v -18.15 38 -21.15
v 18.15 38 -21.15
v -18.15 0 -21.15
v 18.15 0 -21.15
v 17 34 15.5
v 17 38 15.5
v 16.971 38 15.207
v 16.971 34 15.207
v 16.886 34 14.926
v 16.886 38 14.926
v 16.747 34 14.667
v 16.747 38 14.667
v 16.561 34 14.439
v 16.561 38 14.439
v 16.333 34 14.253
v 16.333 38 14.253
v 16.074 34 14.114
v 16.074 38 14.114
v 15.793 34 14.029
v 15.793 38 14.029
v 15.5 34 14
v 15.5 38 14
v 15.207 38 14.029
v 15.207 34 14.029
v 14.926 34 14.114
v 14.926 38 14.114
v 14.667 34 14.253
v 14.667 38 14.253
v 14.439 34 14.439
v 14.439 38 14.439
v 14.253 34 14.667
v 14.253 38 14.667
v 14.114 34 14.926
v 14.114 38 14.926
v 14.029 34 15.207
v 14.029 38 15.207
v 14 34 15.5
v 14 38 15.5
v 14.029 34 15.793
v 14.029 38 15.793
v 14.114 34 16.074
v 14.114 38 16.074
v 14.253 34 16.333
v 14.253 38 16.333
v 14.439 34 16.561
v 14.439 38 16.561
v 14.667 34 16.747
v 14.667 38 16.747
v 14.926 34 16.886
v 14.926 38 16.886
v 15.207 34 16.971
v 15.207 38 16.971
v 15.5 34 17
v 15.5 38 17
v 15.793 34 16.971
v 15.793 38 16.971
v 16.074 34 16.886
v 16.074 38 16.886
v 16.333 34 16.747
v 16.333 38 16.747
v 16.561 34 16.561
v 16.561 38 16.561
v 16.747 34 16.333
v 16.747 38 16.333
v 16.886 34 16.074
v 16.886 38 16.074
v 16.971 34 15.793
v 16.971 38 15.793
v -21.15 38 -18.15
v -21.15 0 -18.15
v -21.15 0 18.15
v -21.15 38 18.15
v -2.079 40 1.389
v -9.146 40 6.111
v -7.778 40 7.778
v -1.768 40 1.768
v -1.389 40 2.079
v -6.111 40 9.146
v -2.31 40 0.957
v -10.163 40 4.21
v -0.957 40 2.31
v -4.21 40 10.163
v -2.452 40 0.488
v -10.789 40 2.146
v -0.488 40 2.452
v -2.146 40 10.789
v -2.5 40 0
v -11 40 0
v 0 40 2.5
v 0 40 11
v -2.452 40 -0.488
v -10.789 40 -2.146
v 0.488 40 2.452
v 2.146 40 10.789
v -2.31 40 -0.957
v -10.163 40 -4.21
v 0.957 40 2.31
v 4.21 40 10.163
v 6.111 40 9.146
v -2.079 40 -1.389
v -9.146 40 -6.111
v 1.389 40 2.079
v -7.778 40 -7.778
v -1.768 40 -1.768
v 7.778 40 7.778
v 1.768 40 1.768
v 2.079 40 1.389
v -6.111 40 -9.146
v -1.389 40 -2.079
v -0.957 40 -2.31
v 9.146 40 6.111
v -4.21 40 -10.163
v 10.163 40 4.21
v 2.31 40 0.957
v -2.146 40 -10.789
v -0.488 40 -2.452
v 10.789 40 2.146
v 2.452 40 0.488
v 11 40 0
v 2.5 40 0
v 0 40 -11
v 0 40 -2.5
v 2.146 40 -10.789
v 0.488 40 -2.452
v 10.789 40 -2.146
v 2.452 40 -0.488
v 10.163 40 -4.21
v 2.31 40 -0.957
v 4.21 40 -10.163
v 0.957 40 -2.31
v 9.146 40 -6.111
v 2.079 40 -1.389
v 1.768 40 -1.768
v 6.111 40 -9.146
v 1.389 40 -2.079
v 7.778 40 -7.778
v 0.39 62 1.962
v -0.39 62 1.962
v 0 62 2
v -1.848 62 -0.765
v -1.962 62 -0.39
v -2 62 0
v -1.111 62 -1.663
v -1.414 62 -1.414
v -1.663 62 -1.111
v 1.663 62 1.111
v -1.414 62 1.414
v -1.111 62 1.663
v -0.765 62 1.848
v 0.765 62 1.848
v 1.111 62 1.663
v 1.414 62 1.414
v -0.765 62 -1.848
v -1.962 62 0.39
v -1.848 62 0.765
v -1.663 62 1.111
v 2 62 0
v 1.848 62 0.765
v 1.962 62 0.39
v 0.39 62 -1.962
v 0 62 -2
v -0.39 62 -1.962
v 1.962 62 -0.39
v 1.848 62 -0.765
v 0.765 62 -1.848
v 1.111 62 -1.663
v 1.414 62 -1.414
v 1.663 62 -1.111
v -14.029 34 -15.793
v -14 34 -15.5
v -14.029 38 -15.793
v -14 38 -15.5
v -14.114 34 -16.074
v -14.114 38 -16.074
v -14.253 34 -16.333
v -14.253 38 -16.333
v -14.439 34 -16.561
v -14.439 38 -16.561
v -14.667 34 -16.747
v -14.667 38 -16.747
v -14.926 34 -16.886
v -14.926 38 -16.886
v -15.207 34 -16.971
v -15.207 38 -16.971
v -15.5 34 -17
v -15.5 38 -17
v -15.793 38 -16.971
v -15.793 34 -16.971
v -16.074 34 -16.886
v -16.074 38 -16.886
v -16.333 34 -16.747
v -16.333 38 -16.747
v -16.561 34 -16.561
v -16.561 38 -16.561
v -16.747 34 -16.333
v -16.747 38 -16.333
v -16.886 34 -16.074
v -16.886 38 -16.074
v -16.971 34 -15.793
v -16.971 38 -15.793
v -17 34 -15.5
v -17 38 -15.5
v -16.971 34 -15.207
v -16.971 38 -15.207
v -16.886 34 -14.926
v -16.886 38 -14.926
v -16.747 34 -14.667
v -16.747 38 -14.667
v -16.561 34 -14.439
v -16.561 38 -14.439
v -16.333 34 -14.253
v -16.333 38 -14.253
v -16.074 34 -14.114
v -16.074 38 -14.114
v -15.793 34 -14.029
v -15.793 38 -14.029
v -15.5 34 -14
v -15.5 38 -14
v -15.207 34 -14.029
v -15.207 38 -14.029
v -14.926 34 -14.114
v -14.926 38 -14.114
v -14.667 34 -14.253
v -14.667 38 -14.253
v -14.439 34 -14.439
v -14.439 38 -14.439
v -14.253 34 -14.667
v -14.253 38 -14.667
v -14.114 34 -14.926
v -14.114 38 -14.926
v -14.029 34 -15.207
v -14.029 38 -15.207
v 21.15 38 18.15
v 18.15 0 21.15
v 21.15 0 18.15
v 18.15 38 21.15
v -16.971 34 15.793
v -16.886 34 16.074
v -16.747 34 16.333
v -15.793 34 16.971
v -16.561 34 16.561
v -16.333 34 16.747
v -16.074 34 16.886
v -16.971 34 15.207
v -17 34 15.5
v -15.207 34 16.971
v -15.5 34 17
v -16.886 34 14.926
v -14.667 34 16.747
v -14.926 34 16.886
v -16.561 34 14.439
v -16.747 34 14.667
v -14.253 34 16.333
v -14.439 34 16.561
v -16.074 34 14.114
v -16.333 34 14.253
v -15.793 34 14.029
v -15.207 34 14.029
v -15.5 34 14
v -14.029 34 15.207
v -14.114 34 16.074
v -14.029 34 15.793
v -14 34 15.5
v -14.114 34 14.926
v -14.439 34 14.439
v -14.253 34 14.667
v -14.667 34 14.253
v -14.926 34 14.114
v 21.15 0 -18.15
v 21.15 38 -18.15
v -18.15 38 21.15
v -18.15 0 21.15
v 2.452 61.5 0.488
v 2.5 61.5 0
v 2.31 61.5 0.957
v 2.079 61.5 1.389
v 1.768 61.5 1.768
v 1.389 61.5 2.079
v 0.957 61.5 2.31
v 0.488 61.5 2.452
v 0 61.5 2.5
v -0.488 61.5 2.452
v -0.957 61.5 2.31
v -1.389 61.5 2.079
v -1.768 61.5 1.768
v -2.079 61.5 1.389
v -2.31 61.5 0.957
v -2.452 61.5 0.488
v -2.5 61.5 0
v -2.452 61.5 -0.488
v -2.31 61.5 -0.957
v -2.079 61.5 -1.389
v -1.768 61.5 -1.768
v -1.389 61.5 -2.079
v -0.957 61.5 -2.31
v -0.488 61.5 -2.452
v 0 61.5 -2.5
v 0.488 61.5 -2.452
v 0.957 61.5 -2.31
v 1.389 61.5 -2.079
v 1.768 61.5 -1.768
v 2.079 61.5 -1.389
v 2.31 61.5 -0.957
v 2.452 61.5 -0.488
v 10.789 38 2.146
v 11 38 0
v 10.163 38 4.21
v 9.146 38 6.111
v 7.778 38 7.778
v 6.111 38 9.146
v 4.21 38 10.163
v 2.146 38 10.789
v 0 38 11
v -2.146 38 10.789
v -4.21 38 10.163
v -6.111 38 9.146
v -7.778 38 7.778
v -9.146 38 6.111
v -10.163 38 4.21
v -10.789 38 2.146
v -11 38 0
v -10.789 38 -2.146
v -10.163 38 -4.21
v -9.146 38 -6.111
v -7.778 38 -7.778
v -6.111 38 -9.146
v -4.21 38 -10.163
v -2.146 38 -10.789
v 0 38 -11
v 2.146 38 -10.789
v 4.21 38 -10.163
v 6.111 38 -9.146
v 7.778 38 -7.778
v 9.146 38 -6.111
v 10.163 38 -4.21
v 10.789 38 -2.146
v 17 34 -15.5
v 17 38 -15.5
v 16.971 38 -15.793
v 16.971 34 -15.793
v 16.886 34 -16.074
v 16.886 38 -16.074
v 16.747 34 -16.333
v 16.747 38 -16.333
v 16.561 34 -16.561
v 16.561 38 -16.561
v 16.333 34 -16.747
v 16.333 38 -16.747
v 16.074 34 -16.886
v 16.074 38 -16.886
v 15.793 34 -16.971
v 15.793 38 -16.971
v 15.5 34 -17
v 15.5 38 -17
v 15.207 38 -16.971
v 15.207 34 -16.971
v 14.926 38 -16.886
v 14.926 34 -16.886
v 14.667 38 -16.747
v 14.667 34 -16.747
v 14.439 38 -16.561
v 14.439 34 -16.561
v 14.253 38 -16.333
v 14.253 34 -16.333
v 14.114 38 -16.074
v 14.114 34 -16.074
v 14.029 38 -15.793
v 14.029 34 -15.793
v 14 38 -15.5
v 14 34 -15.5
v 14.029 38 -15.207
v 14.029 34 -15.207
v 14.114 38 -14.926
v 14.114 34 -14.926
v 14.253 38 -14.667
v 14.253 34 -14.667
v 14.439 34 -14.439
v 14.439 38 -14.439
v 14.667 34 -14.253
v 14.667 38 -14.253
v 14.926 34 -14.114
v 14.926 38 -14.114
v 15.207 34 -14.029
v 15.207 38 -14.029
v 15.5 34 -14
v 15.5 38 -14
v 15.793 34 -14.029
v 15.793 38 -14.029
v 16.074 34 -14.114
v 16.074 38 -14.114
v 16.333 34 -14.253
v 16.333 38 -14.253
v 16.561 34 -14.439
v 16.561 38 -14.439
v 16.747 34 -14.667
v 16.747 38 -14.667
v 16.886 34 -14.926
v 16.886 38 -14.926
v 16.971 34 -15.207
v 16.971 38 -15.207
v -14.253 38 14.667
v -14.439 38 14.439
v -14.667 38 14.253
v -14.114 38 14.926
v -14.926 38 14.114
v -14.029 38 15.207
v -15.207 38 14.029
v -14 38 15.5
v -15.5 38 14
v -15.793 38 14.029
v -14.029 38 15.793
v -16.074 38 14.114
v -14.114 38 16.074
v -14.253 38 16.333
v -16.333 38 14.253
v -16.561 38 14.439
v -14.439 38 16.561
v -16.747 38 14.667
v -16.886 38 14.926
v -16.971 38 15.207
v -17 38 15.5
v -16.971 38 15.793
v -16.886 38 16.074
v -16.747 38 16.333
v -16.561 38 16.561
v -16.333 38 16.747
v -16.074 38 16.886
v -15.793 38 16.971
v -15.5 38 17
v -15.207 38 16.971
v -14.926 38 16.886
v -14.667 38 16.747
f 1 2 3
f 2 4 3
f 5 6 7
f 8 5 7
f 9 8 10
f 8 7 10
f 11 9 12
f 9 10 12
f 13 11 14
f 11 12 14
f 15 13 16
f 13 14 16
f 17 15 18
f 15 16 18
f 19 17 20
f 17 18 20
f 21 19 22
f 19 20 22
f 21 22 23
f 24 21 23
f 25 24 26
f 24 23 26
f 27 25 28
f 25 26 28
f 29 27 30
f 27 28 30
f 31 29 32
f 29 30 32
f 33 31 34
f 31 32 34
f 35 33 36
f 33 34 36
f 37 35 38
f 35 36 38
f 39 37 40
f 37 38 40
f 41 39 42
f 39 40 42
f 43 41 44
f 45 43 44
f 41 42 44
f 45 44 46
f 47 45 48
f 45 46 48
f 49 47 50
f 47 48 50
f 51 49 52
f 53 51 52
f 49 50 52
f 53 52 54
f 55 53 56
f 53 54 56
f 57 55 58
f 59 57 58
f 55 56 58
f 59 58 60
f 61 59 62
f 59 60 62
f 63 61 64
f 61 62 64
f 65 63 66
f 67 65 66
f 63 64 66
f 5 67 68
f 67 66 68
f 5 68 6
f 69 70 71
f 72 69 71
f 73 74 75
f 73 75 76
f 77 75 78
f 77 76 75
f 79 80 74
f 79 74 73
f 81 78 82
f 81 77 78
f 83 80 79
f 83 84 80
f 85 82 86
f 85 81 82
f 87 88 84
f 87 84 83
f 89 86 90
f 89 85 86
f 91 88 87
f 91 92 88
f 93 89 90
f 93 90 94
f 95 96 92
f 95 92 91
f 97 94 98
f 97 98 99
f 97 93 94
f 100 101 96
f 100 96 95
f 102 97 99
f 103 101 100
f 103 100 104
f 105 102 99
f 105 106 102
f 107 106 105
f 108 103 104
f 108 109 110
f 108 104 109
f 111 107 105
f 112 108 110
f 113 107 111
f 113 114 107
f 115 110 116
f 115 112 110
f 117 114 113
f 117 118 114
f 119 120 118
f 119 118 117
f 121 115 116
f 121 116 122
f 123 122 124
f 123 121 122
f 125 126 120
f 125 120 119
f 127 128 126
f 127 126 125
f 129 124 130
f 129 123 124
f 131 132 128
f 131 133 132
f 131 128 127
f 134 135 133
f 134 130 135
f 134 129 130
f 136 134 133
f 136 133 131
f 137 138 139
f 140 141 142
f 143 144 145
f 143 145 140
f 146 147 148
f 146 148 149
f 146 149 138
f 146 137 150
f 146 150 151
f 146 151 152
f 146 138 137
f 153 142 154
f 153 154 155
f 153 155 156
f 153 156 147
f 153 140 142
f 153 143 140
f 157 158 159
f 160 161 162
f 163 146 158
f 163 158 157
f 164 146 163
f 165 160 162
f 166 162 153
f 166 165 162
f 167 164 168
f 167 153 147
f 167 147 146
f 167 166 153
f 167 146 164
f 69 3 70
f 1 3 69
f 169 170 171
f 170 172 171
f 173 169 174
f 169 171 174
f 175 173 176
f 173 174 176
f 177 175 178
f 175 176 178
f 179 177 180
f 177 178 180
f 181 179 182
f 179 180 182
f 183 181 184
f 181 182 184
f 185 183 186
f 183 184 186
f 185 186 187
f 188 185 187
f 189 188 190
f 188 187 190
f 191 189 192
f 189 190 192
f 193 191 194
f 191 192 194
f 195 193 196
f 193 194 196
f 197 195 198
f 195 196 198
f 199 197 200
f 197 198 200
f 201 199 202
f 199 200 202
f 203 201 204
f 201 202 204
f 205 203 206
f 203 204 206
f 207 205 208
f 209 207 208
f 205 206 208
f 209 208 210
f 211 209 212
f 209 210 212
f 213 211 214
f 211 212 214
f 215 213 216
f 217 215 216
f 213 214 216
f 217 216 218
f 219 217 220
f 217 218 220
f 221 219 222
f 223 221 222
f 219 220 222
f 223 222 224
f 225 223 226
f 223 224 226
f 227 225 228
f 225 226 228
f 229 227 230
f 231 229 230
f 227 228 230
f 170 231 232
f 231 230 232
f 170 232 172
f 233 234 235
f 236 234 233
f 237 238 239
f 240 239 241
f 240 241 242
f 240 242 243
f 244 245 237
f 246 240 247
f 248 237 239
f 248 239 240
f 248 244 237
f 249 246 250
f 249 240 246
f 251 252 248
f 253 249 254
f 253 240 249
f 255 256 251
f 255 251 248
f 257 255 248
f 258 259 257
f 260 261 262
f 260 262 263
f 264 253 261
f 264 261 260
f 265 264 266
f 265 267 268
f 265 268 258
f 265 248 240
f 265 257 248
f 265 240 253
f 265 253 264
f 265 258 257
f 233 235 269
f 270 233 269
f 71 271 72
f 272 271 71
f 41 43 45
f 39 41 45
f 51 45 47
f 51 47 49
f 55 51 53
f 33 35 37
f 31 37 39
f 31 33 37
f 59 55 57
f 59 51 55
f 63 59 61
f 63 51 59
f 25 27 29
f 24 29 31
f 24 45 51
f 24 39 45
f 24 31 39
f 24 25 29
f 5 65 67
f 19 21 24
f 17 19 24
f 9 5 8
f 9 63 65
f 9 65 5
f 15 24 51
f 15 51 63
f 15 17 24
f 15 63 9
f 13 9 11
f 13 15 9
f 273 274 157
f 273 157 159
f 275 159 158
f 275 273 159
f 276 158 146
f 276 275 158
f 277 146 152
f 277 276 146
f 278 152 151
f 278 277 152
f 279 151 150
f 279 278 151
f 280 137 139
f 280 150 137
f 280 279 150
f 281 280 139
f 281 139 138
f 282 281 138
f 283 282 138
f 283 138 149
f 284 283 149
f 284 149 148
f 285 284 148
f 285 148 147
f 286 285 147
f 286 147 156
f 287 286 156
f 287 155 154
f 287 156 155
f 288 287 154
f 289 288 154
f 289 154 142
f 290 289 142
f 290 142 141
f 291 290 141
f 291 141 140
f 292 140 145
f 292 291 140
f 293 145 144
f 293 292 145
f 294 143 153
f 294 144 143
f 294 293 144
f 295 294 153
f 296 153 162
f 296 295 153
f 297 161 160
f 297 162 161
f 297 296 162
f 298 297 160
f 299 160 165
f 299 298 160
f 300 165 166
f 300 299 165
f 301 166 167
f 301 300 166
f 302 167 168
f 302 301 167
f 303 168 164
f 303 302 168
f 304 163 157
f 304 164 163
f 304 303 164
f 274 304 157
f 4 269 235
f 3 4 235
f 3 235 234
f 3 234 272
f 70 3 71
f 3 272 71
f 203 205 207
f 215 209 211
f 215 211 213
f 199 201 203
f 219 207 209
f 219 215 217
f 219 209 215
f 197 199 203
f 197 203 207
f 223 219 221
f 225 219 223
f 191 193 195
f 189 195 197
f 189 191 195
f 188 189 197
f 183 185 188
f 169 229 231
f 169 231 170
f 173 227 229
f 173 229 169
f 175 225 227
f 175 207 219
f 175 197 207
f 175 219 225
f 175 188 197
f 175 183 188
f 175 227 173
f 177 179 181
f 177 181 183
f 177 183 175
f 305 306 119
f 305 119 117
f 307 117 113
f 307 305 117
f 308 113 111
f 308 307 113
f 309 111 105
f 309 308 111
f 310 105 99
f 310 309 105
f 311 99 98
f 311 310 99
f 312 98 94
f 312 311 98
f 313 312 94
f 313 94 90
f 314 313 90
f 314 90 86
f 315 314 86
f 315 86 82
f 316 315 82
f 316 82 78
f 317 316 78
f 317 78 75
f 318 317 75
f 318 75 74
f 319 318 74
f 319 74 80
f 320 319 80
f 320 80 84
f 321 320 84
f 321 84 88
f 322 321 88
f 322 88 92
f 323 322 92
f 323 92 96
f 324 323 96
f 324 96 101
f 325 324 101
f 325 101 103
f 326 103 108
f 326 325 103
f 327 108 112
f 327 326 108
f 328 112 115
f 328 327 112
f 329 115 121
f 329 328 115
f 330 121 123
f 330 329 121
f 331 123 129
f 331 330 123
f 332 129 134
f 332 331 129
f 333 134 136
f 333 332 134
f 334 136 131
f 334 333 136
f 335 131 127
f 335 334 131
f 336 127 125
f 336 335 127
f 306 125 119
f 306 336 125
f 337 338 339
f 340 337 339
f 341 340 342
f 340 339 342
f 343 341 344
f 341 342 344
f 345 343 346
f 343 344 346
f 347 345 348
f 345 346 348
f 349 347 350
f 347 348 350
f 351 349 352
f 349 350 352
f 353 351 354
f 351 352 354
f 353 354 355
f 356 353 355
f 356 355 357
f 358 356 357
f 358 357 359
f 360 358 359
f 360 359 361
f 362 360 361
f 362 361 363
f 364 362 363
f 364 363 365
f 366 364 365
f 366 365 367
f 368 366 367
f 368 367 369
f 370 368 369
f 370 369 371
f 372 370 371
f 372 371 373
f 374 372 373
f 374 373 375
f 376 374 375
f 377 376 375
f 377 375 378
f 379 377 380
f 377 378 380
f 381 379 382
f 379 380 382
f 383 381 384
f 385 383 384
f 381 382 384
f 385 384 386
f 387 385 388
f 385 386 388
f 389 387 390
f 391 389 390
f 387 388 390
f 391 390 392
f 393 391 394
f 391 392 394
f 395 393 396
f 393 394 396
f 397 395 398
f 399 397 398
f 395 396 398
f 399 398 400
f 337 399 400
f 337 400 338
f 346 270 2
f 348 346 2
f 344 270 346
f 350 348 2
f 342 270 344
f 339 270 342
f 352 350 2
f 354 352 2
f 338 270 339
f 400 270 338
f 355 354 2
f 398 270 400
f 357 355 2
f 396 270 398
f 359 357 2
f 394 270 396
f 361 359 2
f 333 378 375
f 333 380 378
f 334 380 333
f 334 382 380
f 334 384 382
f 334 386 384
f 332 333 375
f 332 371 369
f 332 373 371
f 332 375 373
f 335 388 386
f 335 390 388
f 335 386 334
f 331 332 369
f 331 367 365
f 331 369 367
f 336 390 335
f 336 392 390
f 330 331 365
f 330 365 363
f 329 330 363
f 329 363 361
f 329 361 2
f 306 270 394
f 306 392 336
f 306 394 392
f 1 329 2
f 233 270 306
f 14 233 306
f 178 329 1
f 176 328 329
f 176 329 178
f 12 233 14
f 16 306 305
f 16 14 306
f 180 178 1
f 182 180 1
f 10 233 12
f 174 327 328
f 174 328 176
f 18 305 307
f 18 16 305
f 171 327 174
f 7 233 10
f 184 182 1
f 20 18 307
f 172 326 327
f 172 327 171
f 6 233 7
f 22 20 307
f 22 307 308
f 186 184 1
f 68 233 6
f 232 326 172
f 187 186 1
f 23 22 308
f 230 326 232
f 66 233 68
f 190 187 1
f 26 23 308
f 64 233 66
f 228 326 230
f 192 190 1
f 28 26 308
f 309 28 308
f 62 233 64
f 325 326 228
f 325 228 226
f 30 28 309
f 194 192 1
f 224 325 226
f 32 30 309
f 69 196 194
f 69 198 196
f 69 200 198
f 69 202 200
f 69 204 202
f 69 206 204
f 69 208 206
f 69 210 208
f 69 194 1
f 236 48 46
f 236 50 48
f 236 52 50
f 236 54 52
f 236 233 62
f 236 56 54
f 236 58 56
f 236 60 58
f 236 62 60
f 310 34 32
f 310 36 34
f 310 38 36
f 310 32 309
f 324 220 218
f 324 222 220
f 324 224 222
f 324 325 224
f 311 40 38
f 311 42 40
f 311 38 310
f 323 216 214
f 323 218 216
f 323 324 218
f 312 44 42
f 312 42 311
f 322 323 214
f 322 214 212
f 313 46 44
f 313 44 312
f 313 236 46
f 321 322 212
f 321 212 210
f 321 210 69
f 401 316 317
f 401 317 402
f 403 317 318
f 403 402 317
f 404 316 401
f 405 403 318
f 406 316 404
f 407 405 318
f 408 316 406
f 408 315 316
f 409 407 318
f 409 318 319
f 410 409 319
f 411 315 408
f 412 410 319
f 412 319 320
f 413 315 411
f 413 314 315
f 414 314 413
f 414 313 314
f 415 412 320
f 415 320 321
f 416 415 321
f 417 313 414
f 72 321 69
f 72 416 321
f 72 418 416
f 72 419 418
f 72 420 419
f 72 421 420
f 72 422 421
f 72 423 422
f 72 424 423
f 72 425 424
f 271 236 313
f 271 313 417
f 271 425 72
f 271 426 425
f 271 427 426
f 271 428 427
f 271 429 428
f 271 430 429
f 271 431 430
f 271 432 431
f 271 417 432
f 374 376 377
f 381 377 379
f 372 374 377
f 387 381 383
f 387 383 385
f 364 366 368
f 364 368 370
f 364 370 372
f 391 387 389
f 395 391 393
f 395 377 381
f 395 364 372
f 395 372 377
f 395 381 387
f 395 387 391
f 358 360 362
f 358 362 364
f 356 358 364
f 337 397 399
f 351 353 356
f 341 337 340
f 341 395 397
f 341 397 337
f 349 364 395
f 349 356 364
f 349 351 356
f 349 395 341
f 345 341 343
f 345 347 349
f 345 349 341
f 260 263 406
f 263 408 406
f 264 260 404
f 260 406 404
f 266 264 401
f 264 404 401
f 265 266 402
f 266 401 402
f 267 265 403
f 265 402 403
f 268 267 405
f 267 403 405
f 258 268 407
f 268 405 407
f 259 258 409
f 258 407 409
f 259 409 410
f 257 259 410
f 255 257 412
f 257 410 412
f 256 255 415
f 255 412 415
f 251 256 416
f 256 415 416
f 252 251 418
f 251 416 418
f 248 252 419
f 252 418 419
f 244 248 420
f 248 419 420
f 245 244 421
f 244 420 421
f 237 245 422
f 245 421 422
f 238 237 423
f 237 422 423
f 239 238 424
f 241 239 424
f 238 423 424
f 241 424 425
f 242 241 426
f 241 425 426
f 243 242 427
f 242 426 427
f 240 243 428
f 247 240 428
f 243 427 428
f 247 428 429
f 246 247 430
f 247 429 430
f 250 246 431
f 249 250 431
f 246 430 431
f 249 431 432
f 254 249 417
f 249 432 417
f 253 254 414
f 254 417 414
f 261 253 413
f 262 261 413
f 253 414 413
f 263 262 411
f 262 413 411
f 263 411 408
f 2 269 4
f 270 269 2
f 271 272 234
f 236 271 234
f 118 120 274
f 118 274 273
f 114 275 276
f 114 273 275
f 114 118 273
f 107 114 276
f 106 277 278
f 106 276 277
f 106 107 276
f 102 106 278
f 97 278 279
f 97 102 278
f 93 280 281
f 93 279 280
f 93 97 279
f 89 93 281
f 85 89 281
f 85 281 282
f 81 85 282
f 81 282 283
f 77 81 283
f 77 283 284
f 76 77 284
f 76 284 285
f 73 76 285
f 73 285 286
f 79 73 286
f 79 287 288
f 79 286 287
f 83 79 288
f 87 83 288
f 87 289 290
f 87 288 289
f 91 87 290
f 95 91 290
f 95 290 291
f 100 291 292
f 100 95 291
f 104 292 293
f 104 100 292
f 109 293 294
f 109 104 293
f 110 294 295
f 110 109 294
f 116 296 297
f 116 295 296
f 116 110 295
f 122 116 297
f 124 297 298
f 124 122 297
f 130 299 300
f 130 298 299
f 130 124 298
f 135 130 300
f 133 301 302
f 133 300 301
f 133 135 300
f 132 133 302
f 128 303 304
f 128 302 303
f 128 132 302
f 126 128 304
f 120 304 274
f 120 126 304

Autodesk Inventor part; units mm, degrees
ref_plane "YZ Plane" through (0, 0, 0) normal (1, 0, 0) x (0, 1, 0)
ref_plane "XZ Plane" through (0, 0, 0) normal (0, 1, 0) x (-1, 0, 0)
ref_plane "XY Plane" through (0, 0, 0) normal (0, 0, 1) x (1, 0, 0)
sketch "Sketch1" plane through (0, 0, 0) normal (0, 1, 0) x (-1, 0, 0)
  line L0 (21.15, 21.15) -> (-21.15, 21.15)
  line L1 (-21.15, 21.15) -> (-21.15, -21.15)
  line L2 (-21.15, -21.15) -> (21.15, -21.15)
  line L3 (21.15, -21.15) -> (21.15, 21.15)
  point P0 (0, 0)
  point P1 (21.15, 0)
  point P2 (0, -21.15)
  dimension "d0" = 42.3
  dimension "d1" = 42.3
extrude "Extrusion1" add sketch "Sketch1" along normal blind 38
chamfer "Chamfer1" distance 3 angle 45 4 edges at (21.15, 19, 21.15) (21.15, 19, -21.15) (-21.15, 19, -21.15) (-21.15, 19, 21.15)
sketch "Sketch2" plane through (0, 38, 0) normal (0, 1, 0) x (1, 0, 0)
  circle A0 centre (0, 0) radius 11
  dimension "d7" = 22
extrude "Extrusion2" add sketch "Sketch2" along normal blind 2
sketch "Sketch3" plane through (0, 40, 0) normal (0, 1, 0) x (1, 0, 0)
  circle A0 centre (0, 0) radius 2.5
  dimension "d10" = 5
extrude "Extrusion3" add sketch "Sketch3" along normal blind 22
chamfer "Chamfer2" distance 0.5 angle 45 1 edges at (-2.5, 62, 0)
sketch "Sketch4" plane through (0, 38, 0) normal (0, 1, 0) x (1, 0, 0)
  circle A0 centre (15.5, 15.5) radius 1.5
  circle A1 centre (15.5, -15.5) radius 1.5
  circle A2 centre (-15.5, -15.5) radius 1.5
  circle A3 centre (-15.5, 15.5) radius 1.5
  line L0 (21.15, -18.15) -> (21.15, 18.15) projected
  line L1 (18.15, 21.15) -> (-18.15, 21.15) projected
  line L2 (-21.15, 18.15) -> (-21.15, -18.15) projected
  line L3 (-18.15, -21.15) -> (18.15, -21.15) projected
  point P0 (0, 0)
  dimension "d16" = 3
  dimension "d17" = 3
  dimension "d18" = 3
  dimension "d19" = 3
  dimension "d20" = 5.65
  dimension "d21" = 5.65
  dimension "d24" = 5.65
  dimension "d25" = 5.65
extrude "Extrusion4" cut sketch "Sketch4" against normal blind 4
properties part number "Stepper Motor"
